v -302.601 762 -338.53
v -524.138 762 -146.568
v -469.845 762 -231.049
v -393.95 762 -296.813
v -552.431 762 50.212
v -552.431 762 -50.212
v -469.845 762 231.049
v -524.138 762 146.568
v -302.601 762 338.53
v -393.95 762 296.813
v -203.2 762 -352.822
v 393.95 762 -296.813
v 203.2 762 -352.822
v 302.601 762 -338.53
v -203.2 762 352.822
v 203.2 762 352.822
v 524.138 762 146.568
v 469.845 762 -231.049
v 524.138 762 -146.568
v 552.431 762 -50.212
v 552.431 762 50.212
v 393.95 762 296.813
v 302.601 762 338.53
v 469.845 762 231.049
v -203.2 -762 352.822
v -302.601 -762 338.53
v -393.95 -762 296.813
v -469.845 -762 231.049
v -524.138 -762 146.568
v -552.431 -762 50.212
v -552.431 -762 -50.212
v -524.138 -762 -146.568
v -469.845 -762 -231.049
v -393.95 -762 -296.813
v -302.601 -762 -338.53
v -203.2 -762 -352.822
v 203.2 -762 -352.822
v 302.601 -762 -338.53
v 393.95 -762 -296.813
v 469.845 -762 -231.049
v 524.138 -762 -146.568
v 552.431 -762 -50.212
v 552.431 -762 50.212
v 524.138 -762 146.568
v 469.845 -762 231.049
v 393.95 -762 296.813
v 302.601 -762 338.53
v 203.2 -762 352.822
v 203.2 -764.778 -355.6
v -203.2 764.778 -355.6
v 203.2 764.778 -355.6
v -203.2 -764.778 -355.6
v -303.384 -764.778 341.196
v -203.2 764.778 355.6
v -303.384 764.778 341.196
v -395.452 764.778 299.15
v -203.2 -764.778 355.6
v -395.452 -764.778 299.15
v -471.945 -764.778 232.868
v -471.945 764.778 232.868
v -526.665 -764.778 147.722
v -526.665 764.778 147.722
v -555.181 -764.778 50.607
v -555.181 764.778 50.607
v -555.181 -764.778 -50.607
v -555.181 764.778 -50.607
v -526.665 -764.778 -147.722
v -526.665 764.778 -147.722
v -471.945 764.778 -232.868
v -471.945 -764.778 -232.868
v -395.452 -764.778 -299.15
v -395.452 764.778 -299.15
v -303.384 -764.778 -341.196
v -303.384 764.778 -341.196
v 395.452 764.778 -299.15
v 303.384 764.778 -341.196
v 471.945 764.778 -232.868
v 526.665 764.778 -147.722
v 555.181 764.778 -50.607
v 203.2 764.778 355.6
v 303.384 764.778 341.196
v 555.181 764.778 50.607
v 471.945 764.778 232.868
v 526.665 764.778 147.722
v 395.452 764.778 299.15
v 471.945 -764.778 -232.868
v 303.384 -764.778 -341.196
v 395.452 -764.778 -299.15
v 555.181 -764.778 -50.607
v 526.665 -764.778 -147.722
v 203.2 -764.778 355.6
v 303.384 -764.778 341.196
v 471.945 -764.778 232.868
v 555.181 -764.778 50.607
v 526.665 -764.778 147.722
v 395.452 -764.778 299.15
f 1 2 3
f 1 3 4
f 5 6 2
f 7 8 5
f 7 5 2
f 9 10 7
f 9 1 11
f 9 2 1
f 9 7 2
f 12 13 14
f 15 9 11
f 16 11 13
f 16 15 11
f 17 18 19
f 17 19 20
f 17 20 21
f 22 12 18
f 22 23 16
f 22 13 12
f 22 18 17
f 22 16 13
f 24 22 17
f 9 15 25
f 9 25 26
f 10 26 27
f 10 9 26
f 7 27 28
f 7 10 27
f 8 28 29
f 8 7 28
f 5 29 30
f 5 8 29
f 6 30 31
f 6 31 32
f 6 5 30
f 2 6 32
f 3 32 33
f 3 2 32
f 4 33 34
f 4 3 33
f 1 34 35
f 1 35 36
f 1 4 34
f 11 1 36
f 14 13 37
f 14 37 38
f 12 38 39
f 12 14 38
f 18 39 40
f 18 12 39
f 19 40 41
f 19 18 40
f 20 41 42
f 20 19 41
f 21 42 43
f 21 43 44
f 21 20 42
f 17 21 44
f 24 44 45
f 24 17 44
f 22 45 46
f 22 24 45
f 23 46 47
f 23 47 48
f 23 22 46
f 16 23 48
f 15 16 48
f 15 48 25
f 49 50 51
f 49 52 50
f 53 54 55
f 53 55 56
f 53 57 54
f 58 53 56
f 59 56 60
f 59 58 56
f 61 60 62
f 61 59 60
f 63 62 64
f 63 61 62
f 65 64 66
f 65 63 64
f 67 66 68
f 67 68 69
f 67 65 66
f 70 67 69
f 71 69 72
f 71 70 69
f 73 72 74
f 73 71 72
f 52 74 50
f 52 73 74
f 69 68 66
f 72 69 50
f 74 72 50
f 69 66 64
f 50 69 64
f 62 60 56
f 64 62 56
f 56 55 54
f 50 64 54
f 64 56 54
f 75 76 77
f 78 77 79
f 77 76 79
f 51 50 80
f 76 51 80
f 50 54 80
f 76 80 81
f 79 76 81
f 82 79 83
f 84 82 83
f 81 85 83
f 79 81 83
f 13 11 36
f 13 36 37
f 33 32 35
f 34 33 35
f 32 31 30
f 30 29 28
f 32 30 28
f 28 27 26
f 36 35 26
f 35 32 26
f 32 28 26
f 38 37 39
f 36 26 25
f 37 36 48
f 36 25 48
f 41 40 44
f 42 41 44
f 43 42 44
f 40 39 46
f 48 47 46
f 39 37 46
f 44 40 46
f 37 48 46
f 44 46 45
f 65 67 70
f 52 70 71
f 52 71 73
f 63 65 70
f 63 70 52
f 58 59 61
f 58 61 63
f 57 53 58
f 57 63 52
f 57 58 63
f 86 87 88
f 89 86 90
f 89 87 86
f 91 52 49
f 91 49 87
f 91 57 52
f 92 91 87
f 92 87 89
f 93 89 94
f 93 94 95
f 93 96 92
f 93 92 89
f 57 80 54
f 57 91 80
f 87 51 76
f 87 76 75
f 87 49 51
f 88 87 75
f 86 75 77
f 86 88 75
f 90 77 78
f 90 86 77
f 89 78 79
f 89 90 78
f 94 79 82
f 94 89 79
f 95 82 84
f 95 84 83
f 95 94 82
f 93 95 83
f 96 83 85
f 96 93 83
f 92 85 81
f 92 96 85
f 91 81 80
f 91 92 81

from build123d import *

# Parameters (mm, degrees)
F1_DEPTH = 762
F3_DEPTH = 762
F5_DEPTH = 2.778125


with BuildPart() as f1:
    # F0 (on Front) → F1 (new body)
    with BuildSketch(Plane.XZ):
        with BuildLine():
            Line((203.2, 355.6), (-203.2, 355.6))
            ThreePointArc((-203.2, 355.6), (-558.8, 0), (-203.2, -355.6))
            Line((-203.2, -355.6), (203.2, -355.6))
            ThreePointArc((203.2, -355.6), (558.8, 0), (203.2, 355.6))
        make_face()
    extrude(amount=F1_DEPTH)

    # F2 (on face) → F3 (cut, through all)
    with BuildSketch(Plane.XZ.offset(762)):
        with BuildLine():
            ThreePointArc((203.2, -352.821875), (556.021875, 0), (203.2, 352.821875))
            Line((203.2, 352.821875), (-203.2, 352.821875))
            ThreePointArc((-203.2, 352.821875), (-556.021875, 0), (-203.2, -352.821875))
            Line((-203.2, -352.821875), (203.2, -352.821875))
        make_face()
    extrude(amount=-F3_DEPTH, mode=Mode.SUBTRACT)

    # F4 (on face) → F5 (join)
    with BuildSketch(Plane.XZ.offset(762)):
        with BuildLine():
            ThreePointArc((-203.2, 355.6), (-558.8, 0), (-203.2, -355.6))
            Line((-203.2, -355.6), (203.2, -355.6))
            ThreePointArc((203.2, -355.6), (558.8, 0), (203.2, 355.6))
            Line((203.2, 355.6), (-203.2, 355.6))
        make_face()
        with BuildLine():
            ThreePointArc((203.2, 352.821875), (556.021875, 0), (203.2, -352.821875))
            Line((203.2, -352.821875), (-203.2, -352.821875))
            ThreePointArc((-203.2, -352.821875), (-556.021875, 0), (-203.2, 352.821875))
            Line((-203.2, 352.821875), (203.2, 352.821875))
        make_face(mode=Mode.SUBTRACT)
        with BuildLine():
            Line((-203.2, -352.821875), (203.2, -352.821875))
            ThreePointArc((203.2, -352.821875), (556.021875, 0), (203.2, 352.821875))
            Line((203.2, 352.821875), (-203.2, 352.821875))
            ThreePointArc((-203.2, 352.821875), (-556.021875, 0), (-203.2, -352.821875))
        make_face()
    extrude(amount=F5_DEPTH)

    # F6: F1 across plane


with BuildPart() as f1_1:
    add(f1.part)
    add(f1.part.mirror(Plane.XZ))


solid = f1_1.part
